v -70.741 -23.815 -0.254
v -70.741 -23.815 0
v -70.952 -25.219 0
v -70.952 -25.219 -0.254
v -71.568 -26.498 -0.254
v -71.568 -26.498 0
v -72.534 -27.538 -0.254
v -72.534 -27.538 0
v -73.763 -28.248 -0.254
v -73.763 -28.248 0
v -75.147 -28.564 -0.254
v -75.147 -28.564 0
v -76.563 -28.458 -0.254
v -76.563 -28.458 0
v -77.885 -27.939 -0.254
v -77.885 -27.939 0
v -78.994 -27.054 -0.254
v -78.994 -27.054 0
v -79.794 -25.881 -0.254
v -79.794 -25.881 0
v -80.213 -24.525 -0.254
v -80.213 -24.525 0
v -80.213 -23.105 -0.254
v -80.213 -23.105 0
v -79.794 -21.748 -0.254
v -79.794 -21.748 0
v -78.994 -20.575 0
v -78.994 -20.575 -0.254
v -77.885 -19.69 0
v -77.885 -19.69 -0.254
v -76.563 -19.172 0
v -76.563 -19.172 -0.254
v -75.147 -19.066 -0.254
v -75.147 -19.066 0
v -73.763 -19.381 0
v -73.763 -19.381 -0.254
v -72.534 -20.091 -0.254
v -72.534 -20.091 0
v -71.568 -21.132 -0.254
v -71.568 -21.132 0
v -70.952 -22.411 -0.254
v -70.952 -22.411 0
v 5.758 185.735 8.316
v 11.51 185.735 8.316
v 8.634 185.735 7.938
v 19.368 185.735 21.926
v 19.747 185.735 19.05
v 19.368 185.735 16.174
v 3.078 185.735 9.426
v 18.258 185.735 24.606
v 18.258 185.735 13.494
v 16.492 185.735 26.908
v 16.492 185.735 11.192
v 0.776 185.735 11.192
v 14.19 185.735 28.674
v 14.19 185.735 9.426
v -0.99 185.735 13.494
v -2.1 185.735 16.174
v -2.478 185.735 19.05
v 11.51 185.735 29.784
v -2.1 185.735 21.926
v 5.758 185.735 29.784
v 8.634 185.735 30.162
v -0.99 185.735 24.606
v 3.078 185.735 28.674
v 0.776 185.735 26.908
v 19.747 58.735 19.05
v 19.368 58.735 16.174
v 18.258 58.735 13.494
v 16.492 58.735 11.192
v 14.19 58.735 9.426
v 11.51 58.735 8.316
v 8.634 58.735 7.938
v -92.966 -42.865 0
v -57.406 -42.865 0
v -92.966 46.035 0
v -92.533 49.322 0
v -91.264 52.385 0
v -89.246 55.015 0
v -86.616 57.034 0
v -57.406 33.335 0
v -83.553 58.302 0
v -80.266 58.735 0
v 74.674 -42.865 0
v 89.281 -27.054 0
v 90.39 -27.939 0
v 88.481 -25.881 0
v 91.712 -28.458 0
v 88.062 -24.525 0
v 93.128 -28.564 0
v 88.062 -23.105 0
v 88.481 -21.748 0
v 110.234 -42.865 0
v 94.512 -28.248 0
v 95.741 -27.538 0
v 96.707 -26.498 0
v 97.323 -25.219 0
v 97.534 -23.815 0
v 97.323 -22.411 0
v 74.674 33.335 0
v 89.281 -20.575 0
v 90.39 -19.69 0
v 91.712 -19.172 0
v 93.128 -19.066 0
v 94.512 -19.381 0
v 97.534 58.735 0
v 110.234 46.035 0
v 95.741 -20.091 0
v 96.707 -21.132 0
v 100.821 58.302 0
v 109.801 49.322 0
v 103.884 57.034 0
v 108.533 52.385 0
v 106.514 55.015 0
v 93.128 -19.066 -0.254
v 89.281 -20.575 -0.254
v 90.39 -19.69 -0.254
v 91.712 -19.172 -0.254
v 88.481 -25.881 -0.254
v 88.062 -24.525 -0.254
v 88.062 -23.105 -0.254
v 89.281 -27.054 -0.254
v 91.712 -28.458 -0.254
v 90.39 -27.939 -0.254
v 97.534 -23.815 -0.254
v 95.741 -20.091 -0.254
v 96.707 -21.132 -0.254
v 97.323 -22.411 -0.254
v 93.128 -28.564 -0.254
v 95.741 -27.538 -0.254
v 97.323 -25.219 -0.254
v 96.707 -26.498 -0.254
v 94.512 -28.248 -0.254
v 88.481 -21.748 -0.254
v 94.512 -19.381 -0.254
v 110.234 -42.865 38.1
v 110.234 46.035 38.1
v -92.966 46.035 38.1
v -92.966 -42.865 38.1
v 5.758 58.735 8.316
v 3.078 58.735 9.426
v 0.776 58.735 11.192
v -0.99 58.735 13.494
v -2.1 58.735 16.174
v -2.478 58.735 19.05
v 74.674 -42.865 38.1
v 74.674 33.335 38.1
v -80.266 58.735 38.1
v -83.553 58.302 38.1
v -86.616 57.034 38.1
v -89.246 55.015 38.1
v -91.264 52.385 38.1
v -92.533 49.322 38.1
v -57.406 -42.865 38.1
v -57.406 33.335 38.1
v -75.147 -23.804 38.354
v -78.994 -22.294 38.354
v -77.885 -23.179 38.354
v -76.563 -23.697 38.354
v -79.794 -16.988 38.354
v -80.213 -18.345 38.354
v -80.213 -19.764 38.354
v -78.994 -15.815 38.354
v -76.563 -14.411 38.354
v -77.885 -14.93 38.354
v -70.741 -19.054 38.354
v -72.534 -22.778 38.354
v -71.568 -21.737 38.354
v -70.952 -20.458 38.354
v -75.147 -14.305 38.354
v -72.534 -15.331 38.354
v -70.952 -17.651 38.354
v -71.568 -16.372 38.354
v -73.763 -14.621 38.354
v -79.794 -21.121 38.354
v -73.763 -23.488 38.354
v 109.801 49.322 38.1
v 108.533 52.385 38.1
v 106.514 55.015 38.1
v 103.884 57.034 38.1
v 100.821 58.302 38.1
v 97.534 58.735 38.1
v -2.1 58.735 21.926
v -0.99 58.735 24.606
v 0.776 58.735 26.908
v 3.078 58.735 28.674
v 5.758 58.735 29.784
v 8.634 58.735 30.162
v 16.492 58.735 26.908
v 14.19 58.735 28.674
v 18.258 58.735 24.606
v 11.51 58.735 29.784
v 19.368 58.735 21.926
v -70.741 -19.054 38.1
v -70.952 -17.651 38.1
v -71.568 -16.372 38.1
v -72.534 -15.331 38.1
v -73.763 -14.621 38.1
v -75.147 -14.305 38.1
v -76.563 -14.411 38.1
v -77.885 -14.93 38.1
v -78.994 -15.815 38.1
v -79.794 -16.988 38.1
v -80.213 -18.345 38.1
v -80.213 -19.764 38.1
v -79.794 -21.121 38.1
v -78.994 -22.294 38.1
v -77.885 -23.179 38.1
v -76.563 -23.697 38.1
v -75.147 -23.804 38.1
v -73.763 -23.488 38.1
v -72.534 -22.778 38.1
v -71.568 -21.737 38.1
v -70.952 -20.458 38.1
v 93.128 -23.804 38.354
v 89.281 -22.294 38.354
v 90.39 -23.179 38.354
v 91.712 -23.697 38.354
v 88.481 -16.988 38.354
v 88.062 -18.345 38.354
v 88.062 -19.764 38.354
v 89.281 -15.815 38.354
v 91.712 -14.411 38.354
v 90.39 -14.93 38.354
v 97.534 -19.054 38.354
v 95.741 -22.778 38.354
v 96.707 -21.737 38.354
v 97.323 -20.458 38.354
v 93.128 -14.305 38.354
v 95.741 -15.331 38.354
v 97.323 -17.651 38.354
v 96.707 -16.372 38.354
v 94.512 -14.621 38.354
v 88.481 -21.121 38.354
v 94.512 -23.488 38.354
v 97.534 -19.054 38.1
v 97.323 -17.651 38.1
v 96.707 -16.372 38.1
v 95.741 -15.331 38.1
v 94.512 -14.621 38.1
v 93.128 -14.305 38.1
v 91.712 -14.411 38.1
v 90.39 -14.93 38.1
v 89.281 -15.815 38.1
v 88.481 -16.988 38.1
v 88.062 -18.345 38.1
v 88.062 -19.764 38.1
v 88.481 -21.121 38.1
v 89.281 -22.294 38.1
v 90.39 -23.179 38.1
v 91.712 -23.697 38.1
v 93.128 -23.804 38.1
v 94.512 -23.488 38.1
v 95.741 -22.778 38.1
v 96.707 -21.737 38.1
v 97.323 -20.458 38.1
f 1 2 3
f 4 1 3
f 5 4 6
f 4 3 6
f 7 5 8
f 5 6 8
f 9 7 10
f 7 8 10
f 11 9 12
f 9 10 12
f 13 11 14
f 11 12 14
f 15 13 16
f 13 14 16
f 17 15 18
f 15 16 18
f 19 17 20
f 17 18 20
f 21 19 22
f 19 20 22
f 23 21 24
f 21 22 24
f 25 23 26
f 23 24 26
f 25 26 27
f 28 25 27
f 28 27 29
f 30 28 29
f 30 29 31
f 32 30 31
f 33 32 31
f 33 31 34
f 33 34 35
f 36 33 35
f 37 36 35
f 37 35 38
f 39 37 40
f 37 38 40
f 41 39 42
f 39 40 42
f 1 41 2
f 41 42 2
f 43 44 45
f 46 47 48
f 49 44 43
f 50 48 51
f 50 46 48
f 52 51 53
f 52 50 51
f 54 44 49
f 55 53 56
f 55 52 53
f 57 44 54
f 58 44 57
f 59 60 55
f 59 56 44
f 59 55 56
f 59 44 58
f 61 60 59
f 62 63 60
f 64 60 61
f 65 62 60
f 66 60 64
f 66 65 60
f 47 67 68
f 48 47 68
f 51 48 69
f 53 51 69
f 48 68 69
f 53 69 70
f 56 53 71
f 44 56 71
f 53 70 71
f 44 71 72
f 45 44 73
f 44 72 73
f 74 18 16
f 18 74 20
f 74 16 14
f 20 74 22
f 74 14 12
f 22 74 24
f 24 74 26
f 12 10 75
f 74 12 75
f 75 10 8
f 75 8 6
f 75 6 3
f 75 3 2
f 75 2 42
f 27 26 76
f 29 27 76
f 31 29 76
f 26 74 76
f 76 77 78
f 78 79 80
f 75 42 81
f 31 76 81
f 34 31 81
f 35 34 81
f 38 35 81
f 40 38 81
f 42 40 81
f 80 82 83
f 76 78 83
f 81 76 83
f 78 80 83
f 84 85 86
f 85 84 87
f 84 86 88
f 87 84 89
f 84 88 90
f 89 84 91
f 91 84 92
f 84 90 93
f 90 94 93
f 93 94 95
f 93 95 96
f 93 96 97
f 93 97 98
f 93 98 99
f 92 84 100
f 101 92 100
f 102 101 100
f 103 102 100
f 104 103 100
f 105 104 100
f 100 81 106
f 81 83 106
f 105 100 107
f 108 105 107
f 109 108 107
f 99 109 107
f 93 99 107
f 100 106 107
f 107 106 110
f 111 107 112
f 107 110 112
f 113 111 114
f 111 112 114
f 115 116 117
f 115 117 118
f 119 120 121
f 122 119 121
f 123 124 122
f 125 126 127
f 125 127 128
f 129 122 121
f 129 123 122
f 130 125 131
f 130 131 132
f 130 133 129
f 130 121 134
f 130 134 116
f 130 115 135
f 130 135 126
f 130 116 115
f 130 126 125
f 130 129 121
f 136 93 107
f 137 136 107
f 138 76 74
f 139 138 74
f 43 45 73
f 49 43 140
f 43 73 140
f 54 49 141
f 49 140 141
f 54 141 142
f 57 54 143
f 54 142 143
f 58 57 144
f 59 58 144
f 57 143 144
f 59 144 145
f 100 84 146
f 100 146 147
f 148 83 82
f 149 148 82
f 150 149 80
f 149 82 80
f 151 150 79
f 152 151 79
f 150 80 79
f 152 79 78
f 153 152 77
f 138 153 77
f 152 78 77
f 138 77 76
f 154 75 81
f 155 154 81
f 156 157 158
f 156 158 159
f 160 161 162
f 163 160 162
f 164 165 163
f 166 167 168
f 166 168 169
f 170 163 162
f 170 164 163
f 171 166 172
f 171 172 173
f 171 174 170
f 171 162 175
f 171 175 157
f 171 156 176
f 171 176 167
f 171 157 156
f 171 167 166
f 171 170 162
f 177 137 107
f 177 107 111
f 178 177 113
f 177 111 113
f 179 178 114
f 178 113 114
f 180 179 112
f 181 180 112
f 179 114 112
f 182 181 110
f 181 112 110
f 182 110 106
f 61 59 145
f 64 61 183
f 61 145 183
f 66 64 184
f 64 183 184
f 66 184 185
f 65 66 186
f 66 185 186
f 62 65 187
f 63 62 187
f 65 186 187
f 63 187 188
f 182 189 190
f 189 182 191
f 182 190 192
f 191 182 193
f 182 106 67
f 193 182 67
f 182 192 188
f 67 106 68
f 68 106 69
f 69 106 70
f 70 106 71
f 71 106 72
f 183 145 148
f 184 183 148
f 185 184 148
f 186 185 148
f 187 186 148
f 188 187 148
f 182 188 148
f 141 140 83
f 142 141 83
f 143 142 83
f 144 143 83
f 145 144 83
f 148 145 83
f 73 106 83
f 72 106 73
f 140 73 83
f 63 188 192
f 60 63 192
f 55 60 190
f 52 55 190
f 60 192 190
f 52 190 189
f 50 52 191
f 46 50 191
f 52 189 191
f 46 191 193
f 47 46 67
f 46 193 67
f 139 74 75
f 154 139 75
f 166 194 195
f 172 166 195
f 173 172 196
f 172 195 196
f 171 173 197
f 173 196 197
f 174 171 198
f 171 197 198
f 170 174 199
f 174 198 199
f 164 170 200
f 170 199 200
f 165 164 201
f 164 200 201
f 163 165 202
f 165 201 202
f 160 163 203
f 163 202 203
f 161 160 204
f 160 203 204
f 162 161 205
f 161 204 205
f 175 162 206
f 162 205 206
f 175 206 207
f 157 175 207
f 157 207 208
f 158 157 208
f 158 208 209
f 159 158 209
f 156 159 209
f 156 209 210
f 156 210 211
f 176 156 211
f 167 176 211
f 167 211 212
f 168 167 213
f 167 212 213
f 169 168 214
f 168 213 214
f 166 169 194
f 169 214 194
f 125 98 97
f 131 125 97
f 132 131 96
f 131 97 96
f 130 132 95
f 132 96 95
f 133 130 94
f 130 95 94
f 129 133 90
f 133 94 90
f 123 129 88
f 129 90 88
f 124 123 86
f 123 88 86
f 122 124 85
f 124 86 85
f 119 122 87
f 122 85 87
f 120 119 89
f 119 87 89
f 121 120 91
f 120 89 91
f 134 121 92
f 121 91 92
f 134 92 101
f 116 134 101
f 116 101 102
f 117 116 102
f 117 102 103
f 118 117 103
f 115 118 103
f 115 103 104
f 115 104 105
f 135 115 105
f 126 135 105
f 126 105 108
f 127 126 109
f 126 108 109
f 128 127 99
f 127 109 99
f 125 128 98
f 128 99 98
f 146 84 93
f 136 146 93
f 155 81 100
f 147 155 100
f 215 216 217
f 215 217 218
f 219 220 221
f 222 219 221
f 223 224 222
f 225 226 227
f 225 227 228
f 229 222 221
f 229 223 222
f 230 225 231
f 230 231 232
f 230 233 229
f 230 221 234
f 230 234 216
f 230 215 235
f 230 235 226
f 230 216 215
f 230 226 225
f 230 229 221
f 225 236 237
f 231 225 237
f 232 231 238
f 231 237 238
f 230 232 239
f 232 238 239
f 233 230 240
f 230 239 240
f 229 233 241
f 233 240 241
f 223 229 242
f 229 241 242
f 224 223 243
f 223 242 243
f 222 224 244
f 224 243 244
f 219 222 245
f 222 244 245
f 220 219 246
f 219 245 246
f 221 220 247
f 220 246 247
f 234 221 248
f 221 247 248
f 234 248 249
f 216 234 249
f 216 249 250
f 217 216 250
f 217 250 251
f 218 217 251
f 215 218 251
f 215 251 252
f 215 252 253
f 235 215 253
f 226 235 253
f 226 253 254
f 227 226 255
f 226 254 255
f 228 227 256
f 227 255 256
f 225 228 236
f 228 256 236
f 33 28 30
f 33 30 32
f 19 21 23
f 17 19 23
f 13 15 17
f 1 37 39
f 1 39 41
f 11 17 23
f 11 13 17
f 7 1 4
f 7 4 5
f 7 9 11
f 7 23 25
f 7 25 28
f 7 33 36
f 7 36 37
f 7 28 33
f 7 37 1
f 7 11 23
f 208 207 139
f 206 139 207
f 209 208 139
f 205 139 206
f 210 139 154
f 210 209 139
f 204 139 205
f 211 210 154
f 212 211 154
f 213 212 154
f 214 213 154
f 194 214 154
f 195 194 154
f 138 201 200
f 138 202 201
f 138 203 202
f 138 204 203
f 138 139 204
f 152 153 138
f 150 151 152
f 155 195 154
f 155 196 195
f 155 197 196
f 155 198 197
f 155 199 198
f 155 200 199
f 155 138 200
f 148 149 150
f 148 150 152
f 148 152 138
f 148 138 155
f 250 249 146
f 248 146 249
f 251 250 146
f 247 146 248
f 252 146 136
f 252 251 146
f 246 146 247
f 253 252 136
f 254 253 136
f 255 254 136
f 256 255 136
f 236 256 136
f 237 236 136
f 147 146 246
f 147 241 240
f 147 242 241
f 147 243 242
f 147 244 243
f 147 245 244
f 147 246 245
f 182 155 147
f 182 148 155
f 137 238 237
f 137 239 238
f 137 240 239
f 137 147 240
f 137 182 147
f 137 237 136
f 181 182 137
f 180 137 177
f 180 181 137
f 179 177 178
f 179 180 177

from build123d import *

# Parameters (mm, degrees)
F0_W     = 35.56
F0_H     = 76.2
F1_DEPTH = 38.1
F2_R     = 4.7625
F3_DEPTH = 0.254
F5_DEPTH = 127
F6_R     = 4.7625
F7_DEPTH = 0.254


with BuildPart() as f1:
    # F0 (on Top) → F1 (new body)
    with BuildSketch(Plane.XY):
        with BuildLine():
            Line((97.53417238, 58.7352159441), (-80.26582762, 58.7352159441))
            ThreePointArc((-80.26582762, 58.7352159441), (-89.2460837411, 55.0154720651), (-92.96582762, 46.0352159441))
            Line((-92.96582762, 46.0352159441), (-92.96582762, 33.3352159441))
            Line((-92.96582762, 33.3352159441), (-57.40582762, 33.3352159441))
            Line((-57.40582762, 33.3352159441), (74.67417238, 33.3352159441))
            Line((74.67417238, 33.3352159441), (110.23417238, 33.3352159441))
            Line((110.23417238, 33.3352159441), (110.23417238, 46.0352159441))
            ThreePointArc((110.23417238, 46.0352159441), (106.514428501, 55.0154720651), (97.53417238, 58.7352159441))
        make_face()
        with Locations((-75.18582762, -4.7647840559)):
            Rectangle(F0_W, F0_H)
        with Locations((92.45417238, -4.7647840559)):
            Rectangle(F0_W, F0_H)
    extrude(amount=F1_DEPTH)

    # F2 (on face) → F3 (join)
    with BuildSketch(Plane.XY.offset(38.1)):
        with Locations((-75.50332762, -19.0544008167)):
            Circle(F2_R)
        with Locations((92.77167238, -19.0544008167)):
            Circle(F2_R)
    extrude(amount=F3_DEPTH)

    # F4 (on face) → F5 (join)
    with BuildSketch(Plane(origin=(0, 58.7352159441, 0), x_dir=(-1, 0, 0), z_dir=(0, 1, 0))):
        with BuildLine():
            Line((-19.74667238, 19.05), (-8.63417238, 19.05))
            Line((-8.63417238, 19.05), (-8.63417238, 30.1625))
            ThreePointArc((-8.63417238, 30.1625), (-16.4918964859, 26.9077241059), (-19.74667238, 19.05))
        make_face()
        with BuildLine():
            Line((-8.63417238, 30.1625), (-8.63417238, 19.05))
            Line((-8.63417238, 19.05), (2.47832762, 19.05))
            ThreePointArc((2.47832762, 19.05), (-0.776448274, 26.9077241059), (-8.63417238, 30.1625))
        make_face()
        with BuildLine():
            Line((2.47832762, 19.05), (-8.63417238, 19.05))
            Line((-8.63417238, 19.05), (-8.63417238, 7.9375))
            ThreePointArc((-8.63417238, 7.9375), (-0.776448274, 11.1922758941), (2.47832762, 19.05))
        make_face()
        with BuildLine():
            Line((-8.63417238, 7.9375), (-8.63417238, 19.05))
            Line((-8.63417238, 19.05), (-19.74667238, 19.05))
            ThreePointArc((-19.74667238, 19.05), (-16.4918964859, 11.1922758941), (-8.63417238, 7.9375))
        make_face()
    extrude(amount=F5_DEPTH)

    # F6 (on face) → F7 (join)
    with BuildSketch(Plane(origin=(0, 0, 0), x_dir=(1, 0, 0), z_dir=(0, 0, -1))):
        with Locations((-75.50332762, 23.8147840559)):
            Circle(F6_R)
        with Locations((92.77167238, 23.8147840559)):
            Circle(F6_R)
    extrude(amount=F7_DEPTH)


solid = f1.part
